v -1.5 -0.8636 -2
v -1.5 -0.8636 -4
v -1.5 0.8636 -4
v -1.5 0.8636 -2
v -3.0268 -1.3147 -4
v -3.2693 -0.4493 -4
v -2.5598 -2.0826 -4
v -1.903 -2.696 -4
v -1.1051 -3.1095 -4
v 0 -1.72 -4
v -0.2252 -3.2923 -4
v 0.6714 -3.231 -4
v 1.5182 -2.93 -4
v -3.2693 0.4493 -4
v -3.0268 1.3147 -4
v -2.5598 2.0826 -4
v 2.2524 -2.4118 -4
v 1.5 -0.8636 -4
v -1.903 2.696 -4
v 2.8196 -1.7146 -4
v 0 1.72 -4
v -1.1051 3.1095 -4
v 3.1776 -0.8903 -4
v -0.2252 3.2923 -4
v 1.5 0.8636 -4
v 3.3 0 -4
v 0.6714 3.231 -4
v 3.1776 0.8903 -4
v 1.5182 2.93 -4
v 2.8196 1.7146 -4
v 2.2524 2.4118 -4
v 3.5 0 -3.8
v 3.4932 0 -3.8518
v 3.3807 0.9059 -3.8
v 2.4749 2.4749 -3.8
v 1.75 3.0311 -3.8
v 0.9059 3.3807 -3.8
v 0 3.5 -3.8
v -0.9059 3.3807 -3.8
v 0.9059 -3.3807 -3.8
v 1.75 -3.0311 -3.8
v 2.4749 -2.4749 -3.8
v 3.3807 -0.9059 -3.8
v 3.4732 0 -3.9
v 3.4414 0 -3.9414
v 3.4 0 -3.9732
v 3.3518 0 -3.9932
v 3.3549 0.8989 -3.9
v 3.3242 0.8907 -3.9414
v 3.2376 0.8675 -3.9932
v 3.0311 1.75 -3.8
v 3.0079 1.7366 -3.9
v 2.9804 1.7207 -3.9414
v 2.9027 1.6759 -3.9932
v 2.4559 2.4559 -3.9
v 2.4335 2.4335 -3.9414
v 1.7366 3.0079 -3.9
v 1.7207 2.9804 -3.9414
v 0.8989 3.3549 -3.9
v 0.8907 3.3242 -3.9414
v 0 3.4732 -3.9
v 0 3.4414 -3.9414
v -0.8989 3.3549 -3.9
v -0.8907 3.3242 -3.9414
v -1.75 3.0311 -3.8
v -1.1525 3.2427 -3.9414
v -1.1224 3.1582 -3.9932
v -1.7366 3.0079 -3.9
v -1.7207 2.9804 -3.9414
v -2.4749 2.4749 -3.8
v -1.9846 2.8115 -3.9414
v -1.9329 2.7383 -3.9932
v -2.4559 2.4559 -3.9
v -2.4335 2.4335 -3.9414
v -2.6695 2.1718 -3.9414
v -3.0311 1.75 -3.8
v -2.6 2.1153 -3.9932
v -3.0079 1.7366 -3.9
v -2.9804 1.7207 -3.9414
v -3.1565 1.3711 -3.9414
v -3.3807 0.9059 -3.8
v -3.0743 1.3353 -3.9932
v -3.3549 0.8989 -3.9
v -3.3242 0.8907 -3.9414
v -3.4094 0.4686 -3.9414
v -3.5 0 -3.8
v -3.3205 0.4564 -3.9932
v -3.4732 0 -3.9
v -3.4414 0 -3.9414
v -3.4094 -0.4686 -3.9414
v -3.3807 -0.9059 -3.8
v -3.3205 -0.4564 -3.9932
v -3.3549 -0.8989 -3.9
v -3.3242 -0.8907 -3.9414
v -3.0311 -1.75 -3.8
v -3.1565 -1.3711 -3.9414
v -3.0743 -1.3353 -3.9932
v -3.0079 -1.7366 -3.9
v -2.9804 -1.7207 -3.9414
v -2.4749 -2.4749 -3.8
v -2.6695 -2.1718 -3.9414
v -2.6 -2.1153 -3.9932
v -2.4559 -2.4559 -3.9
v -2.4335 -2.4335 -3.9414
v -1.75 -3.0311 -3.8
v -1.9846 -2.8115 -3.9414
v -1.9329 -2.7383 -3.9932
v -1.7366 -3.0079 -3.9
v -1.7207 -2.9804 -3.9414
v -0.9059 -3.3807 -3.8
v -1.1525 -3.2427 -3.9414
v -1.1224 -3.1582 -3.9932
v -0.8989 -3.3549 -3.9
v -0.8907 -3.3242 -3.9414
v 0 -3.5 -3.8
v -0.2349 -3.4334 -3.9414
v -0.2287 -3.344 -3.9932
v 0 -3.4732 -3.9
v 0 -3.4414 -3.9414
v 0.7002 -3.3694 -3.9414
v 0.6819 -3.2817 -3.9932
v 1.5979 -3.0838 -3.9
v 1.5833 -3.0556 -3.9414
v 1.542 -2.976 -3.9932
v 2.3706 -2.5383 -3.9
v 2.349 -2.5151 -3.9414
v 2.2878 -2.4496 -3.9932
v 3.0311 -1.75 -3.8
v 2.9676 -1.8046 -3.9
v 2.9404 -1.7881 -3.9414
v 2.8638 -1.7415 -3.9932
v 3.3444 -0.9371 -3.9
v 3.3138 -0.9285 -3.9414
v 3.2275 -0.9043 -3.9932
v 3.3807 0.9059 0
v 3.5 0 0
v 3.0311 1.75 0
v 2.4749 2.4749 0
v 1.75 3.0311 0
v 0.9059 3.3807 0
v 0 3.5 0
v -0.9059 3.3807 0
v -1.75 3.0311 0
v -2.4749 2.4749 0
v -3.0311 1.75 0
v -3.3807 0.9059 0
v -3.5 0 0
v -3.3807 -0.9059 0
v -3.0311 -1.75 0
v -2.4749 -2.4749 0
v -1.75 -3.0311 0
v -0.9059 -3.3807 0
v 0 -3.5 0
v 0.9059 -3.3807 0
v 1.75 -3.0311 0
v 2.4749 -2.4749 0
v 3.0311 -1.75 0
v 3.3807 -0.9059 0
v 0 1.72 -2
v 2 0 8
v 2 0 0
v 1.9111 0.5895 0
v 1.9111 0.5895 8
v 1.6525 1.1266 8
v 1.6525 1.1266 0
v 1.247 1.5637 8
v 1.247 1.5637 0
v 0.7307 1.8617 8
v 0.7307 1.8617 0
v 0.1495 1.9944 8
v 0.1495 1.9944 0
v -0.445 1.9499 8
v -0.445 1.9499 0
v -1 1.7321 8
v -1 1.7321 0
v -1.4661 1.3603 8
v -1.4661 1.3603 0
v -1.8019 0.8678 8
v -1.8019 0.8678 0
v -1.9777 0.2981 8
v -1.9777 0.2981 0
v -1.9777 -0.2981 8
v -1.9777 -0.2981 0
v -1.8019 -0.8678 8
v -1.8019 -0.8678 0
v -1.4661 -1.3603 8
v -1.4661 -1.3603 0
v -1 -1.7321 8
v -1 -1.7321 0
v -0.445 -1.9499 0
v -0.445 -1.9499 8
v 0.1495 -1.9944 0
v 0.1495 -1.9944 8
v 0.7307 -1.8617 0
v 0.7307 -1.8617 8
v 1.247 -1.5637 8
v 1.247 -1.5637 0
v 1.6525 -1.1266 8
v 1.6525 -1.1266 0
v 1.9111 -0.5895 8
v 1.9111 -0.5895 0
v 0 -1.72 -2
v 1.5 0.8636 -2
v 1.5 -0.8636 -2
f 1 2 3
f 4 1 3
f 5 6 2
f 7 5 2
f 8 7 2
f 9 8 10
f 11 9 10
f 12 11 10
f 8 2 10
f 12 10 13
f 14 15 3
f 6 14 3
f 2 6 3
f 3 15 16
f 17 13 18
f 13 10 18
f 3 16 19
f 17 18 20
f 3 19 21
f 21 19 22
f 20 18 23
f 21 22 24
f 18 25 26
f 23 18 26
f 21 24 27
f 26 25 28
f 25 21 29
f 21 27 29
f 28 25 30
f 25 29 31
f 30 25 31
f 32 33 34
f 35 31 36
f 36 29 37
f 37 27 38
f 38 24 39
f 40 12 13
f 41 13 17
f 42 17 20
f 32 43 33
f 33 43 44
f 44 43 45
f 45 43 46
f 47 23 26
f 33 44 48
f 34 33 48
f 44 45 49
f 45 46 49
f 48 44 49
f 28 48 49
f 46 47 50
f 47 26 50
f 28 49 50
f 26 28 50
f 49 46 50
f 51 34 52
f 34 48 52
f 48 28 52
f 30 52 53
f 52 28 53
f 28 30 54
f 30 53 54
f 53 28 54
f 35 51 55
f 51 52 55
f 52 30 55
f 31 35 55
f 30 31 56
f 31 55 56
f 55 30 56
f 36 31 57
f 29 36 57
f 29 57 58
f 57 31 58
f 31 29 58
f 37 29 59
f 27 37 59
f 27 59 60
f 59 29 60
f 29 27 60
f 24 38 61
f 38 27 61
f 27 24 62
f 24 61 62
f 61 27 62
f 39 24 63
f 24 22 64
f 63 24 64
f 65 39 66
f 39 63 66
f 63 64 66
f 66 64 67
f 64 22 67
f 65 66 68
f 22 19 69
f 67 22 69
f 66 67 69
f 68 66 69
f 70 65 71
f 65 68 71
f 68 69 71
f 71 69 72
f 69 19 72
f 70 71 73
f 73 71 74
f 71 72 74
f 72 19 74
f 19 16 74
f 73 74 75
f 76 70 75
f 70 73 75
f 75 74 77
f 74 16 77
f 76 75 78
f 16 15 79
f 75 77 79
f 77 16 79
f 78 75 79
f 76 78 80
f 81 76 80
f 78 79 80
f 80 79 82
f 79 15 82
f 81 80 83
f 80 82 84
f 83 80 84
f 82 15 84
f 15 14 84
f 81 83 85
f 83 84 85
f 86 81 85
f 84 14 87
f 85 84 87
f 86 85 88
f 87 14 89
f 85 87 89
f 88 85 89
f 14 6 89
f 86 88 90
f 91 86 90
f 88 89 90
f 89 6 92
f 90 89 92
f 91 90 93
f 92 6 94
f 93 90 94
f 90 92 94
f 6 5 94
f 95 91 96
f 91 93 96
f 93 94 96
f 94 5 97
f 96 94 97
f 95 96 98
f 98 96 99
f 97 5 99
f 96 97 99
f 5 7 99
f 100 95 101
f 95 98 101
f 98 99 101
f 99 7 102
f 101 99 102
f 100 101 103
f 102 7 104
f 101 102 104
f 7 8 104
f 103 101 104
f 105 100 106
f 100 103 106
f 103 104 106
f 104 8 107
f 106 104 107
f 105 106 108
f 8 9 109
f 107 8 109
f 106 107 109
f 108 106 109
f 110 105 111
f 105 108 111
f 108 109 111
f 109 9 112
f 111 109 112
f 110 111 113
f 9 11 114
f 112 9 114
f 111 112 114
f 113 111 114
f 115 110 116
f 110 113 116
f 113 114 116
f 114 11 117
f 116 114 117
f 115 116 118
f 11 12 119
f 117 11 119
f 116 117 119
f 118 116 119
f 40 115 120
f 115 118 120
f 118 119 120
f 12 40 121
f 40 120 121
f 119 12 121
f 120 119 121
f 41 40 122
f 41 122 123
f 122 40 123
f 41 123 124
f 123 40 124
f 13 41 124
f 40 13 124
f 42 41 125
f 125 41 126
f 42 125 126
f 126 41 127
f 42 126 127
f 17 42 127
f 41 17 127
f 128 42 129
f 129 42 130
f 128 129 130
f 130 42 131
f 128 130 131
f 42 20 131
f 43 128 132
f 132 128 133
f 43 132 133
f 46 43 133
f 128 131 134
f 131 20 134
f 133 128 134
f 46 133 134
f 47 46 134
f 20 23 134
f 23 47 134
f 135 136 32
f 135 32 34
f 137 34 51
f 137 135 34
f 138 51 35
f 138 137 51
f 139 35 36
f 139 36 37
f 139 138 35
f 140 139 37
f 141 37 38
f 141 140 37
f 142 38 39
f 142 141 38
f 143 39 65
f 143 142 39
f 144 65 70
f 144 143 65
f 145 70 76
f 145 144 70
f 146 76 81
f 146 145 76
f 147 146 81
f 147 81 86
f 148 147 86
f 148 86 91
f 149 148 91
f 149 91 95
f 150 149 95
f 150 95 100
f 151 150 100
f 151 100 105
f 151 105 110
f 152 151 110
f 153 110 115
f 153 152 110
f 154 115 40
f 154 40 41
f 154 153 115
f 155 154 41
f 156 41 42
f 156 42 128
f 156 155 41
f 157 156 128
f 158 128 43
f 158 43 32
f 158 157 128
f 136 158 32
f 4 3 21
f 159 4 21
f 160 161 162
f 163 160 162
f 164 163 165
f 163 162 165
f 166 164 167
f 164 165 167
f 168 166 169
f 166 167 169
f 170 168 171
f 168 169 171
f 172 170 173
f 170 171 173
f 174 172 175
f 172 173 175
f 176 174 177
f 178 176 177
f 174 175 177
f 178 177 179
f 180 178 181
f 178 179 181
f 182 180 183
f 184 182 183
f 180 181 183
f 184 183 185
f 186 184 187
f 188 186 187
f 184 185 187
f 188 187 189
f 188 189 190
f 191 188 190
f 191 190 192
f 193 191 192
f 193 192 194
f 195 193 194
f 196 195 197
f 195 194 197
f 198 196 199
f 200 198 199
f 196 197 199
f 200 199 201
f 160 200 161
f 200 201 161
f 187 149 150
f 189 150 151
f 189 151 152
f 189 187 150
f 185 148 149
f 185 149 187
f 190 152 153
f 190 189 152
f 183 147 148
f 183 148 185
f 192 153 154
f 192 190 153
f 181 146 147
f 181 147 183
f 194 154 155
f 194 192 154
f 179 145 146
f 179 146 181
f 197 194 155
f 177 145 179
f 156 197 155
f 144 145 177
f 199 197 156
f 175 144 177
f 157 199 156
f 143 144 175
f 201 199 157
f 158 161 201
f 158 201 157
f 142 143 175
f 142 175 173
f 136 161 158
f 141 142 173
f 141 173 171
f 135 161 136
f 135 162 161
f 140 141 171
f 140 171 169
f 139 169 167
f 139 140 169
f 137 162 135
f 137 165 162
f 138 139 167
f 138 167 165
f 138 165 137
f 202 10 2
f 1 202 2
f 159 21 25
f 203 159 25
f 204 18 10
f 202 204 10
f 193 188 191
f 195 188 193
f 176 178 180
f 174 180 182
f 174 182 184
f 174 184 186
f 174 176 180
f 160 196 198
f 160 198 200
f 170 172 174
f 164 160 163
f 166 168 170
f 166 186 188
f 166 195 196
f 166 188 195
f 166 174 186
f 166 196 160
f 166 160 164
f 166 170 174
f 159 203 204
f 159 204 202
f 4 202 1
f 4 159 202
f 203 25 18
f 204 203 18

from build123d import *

# Parameters (mm, degrees)
SKETCH_1_R          = 2
EXTRUDE_1_DEPTH     = 8
SKETCH_2_R          = 3.5
EXTRUDE_2_DEPTH     = 4
CUT_EXTRUDE_1_DEPTH = 2
FILLET_1_R          = 0.2


with BuildPart() as part:
    # 草图1 → 凸台-拉伸1 (new body)
    with BuildSketch(Plane.XY):
        Circle(SKETCH_1_R)
    extrude(amount=EXTRUDE_1_DEPTH)

    # 草图2 → 凸台-拉伸2 (add)
    with BuildSketch(Plane.XY):
        Circle(SKETCH_2_R)
    extrude(amount=-EXTRUDE_2_DEPTH)

    # 草图3 → 切除-拉伸1 (cut)
    with BuildSketch(Plane(origin=(0, 0, -4), x_dir=(-1, 0, 0), z_dir=(0, 0, -1))):
        Polygon((0, 1.72), (-1.5, 0.863623327), (-1.5, -0.863623327), (0, -1.72), (1.5, -0.863623327), (1.5, 0.863623327), align=None)
    extrude(amount=-CUT_EXTRUDE_1_DEPTH, mode=Mode.SUBTRACT)

    # 圆角1
    fillet_1_edges = [part.edges().sort_by_distance(p)[0] for p in [
        (-3.5, 0, -4),
    ]]
    fillet(fillet_1_edges, radius=FILLET_1_R)


solid = part.part
